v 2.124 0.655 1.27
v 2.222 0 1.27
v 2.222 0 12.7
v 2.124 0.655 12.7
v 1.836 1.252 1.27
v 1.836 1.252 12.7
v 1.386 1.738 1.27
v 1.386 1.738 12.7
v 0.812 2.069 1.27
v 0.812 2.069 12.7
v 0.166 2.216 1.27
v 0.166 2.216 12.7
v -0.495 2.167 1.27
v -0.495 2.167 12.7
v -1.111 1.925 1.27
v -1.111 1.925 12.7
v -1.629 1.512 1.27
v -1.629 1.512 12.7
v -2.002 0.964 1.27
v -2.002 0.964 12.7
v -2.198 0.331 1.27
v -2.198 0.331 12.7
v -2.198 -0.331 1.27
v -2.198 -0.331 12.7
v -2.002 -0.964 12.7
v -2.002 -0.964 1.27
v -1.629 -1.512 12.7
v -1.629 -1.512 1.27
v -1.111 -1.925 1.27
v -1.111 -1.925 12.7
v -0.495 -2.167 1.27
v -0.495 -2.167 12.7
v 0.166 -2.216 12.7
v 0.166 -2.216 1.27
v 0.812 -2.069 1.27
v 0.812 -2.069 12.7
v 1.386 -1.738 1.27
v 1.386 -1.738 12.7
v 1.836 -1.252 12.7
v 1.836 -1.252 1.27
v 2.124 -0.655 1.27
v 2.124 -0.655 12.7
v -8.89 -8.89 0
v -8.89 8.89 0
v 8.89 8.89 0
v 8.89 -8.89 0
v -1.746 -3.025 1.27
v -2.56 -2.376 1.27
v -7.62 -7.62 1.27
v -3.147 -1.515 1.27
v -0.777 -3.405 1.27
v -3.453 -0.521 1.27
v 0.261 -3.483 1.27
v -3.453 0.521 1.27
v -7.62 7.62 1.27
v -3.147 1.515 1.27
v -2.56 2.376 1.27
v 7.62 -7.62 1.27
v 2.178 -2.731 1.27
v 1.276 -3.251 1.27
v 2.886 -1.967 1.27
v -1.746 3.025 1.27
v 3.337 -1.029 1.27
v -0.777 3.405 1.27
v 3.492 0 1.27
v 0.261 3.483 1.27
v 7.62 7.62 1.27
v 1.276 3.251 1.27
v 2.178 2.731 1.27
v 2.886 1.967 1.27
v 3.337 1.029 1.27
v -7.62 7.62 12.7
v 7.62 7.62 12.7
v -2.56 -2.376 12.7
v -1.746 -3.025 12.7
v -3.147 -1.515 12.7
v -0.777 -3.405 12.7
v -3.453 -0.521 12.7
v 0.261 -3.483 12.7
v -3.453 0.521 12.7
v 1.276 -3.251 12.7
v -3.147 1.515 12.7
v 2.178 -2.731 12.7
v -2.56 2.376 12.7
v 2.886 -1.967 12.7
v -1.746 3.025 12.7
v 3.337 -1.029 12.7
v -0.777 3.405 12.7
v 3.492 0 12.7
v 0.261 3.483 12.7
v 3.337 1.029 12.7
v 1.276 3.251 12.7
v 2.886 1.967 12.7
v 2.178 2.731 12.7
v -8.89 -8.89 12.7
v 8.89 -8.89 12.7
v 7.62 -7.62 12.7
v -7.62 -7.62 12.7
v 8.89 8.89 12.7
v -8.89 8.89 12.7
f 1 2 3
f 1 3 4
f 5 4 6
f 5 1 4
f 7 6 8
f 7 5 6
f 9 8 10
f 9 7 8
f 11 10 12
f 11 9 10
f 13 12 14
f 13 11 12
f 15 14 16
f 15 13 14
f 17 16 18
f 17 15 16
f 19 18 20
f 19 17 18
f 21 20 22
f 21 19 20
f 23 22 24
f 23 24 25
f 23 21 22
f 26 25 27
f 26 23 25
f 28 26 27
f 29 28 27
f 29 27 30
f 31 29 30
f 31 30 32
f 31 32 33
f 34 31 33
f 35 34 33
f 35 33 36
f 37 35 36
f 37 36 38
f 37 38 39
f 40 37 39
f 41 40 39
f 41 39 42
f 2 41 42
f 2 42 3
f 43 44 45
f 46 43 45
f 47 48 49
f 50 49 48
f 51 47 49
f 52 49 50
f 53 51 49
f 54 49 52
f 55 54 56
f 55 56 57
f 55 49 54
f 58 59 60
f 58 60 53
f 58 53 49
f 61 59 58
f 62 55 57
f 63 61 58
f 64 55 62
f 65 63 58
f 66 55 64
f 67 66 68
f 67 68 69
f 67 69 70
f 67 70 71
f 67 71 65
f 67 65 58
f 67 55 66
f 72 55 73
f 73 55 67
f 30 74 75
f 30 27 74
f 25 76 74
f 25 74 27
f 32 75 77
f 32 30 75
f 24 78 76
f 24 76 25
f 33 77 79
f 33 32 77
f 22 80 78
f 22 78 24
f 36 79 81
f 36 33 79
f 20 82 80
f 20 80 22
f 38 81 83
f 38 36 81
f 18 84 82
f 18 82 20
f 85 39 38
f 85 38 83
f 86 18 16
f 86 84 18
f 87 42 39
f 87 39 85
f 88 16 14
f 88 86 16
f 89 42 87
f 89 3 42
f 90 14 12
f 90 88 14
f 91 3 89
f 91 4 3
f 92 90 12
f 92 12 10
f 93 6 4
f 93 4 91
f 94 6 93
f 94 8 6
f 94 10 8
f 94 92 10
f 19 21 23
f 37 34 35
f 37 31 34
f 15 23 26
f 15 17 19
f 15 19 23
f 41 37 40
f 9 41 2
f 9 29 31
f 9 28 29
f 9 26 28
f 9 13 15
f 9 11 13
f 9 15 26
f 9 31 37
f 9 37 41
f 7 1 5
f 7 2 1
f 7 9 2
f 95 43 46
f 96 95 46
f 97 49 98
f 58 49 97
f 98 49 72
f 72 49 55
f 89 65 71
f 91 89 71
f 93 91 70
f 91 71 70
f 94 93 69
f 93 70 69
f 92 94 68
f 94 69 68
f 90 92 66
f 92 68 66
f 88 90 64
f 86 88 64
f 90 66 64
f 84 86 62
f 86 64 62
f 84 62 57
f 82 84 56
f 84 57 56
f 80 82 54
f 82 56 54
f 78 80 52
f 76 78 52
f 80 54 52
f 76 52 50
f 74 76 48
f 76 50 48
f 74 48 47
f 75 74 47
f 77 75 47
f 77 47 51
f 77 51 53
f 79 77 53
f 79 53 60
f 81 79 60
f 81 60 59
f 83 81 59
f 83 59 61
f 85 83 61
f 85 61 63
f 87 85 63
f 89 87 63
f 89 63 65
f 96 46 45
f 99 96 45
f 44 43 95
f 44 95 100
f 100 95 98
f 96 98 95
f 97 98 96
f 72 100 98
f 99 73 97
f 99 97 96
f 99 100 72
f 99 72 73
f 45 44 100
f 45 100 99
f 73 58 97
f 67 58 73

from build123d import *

# Parameters (mm, degrees)
F0_W     = 15.24
F0_H     = 15.24
F0_R     = 3.4925
F0_R_2   = 2.2225
F1_DEPTH = 1.27
F0_W_2   = 17.78
F0_H_2   = 17.78
F2_DEPTH = 12.7
F3_DEPTH = 12.7


with BuildPart() as f1:
    # F0 (on Top) → F1 (new body)
    with BuildSketch(Plane.XY):
        Rectangle(F0_W, F0_H)
        Circle(F0_R, mode=Mode.SUBTRACT)
        Circle(F0_R)
        Circle(F0_R_2, mode=Mode.SUBTRACT)
        Circle(F0_R_2)
    extrude(amount=F1_DEPTH)

    # F0 (on Top) → F2 (join)
    with BuildSketch(Plane.XY):
        Rectangle(F0_W_2, F0_H_2)
        Rectangle(F0_W, F0_H, mode=Mode.SUBTRACT)
    extrude(amount=F2_DEPTH)

    # F0 (on Top) → F3 (join)
    with BuildSketch(Plane.XY):
        Circle(F0_R)
        Circle(F0_R_2, mode=Mode.SUBTRACT)
    extrude(amount=F3_DEPTH)


solid = f1.part
